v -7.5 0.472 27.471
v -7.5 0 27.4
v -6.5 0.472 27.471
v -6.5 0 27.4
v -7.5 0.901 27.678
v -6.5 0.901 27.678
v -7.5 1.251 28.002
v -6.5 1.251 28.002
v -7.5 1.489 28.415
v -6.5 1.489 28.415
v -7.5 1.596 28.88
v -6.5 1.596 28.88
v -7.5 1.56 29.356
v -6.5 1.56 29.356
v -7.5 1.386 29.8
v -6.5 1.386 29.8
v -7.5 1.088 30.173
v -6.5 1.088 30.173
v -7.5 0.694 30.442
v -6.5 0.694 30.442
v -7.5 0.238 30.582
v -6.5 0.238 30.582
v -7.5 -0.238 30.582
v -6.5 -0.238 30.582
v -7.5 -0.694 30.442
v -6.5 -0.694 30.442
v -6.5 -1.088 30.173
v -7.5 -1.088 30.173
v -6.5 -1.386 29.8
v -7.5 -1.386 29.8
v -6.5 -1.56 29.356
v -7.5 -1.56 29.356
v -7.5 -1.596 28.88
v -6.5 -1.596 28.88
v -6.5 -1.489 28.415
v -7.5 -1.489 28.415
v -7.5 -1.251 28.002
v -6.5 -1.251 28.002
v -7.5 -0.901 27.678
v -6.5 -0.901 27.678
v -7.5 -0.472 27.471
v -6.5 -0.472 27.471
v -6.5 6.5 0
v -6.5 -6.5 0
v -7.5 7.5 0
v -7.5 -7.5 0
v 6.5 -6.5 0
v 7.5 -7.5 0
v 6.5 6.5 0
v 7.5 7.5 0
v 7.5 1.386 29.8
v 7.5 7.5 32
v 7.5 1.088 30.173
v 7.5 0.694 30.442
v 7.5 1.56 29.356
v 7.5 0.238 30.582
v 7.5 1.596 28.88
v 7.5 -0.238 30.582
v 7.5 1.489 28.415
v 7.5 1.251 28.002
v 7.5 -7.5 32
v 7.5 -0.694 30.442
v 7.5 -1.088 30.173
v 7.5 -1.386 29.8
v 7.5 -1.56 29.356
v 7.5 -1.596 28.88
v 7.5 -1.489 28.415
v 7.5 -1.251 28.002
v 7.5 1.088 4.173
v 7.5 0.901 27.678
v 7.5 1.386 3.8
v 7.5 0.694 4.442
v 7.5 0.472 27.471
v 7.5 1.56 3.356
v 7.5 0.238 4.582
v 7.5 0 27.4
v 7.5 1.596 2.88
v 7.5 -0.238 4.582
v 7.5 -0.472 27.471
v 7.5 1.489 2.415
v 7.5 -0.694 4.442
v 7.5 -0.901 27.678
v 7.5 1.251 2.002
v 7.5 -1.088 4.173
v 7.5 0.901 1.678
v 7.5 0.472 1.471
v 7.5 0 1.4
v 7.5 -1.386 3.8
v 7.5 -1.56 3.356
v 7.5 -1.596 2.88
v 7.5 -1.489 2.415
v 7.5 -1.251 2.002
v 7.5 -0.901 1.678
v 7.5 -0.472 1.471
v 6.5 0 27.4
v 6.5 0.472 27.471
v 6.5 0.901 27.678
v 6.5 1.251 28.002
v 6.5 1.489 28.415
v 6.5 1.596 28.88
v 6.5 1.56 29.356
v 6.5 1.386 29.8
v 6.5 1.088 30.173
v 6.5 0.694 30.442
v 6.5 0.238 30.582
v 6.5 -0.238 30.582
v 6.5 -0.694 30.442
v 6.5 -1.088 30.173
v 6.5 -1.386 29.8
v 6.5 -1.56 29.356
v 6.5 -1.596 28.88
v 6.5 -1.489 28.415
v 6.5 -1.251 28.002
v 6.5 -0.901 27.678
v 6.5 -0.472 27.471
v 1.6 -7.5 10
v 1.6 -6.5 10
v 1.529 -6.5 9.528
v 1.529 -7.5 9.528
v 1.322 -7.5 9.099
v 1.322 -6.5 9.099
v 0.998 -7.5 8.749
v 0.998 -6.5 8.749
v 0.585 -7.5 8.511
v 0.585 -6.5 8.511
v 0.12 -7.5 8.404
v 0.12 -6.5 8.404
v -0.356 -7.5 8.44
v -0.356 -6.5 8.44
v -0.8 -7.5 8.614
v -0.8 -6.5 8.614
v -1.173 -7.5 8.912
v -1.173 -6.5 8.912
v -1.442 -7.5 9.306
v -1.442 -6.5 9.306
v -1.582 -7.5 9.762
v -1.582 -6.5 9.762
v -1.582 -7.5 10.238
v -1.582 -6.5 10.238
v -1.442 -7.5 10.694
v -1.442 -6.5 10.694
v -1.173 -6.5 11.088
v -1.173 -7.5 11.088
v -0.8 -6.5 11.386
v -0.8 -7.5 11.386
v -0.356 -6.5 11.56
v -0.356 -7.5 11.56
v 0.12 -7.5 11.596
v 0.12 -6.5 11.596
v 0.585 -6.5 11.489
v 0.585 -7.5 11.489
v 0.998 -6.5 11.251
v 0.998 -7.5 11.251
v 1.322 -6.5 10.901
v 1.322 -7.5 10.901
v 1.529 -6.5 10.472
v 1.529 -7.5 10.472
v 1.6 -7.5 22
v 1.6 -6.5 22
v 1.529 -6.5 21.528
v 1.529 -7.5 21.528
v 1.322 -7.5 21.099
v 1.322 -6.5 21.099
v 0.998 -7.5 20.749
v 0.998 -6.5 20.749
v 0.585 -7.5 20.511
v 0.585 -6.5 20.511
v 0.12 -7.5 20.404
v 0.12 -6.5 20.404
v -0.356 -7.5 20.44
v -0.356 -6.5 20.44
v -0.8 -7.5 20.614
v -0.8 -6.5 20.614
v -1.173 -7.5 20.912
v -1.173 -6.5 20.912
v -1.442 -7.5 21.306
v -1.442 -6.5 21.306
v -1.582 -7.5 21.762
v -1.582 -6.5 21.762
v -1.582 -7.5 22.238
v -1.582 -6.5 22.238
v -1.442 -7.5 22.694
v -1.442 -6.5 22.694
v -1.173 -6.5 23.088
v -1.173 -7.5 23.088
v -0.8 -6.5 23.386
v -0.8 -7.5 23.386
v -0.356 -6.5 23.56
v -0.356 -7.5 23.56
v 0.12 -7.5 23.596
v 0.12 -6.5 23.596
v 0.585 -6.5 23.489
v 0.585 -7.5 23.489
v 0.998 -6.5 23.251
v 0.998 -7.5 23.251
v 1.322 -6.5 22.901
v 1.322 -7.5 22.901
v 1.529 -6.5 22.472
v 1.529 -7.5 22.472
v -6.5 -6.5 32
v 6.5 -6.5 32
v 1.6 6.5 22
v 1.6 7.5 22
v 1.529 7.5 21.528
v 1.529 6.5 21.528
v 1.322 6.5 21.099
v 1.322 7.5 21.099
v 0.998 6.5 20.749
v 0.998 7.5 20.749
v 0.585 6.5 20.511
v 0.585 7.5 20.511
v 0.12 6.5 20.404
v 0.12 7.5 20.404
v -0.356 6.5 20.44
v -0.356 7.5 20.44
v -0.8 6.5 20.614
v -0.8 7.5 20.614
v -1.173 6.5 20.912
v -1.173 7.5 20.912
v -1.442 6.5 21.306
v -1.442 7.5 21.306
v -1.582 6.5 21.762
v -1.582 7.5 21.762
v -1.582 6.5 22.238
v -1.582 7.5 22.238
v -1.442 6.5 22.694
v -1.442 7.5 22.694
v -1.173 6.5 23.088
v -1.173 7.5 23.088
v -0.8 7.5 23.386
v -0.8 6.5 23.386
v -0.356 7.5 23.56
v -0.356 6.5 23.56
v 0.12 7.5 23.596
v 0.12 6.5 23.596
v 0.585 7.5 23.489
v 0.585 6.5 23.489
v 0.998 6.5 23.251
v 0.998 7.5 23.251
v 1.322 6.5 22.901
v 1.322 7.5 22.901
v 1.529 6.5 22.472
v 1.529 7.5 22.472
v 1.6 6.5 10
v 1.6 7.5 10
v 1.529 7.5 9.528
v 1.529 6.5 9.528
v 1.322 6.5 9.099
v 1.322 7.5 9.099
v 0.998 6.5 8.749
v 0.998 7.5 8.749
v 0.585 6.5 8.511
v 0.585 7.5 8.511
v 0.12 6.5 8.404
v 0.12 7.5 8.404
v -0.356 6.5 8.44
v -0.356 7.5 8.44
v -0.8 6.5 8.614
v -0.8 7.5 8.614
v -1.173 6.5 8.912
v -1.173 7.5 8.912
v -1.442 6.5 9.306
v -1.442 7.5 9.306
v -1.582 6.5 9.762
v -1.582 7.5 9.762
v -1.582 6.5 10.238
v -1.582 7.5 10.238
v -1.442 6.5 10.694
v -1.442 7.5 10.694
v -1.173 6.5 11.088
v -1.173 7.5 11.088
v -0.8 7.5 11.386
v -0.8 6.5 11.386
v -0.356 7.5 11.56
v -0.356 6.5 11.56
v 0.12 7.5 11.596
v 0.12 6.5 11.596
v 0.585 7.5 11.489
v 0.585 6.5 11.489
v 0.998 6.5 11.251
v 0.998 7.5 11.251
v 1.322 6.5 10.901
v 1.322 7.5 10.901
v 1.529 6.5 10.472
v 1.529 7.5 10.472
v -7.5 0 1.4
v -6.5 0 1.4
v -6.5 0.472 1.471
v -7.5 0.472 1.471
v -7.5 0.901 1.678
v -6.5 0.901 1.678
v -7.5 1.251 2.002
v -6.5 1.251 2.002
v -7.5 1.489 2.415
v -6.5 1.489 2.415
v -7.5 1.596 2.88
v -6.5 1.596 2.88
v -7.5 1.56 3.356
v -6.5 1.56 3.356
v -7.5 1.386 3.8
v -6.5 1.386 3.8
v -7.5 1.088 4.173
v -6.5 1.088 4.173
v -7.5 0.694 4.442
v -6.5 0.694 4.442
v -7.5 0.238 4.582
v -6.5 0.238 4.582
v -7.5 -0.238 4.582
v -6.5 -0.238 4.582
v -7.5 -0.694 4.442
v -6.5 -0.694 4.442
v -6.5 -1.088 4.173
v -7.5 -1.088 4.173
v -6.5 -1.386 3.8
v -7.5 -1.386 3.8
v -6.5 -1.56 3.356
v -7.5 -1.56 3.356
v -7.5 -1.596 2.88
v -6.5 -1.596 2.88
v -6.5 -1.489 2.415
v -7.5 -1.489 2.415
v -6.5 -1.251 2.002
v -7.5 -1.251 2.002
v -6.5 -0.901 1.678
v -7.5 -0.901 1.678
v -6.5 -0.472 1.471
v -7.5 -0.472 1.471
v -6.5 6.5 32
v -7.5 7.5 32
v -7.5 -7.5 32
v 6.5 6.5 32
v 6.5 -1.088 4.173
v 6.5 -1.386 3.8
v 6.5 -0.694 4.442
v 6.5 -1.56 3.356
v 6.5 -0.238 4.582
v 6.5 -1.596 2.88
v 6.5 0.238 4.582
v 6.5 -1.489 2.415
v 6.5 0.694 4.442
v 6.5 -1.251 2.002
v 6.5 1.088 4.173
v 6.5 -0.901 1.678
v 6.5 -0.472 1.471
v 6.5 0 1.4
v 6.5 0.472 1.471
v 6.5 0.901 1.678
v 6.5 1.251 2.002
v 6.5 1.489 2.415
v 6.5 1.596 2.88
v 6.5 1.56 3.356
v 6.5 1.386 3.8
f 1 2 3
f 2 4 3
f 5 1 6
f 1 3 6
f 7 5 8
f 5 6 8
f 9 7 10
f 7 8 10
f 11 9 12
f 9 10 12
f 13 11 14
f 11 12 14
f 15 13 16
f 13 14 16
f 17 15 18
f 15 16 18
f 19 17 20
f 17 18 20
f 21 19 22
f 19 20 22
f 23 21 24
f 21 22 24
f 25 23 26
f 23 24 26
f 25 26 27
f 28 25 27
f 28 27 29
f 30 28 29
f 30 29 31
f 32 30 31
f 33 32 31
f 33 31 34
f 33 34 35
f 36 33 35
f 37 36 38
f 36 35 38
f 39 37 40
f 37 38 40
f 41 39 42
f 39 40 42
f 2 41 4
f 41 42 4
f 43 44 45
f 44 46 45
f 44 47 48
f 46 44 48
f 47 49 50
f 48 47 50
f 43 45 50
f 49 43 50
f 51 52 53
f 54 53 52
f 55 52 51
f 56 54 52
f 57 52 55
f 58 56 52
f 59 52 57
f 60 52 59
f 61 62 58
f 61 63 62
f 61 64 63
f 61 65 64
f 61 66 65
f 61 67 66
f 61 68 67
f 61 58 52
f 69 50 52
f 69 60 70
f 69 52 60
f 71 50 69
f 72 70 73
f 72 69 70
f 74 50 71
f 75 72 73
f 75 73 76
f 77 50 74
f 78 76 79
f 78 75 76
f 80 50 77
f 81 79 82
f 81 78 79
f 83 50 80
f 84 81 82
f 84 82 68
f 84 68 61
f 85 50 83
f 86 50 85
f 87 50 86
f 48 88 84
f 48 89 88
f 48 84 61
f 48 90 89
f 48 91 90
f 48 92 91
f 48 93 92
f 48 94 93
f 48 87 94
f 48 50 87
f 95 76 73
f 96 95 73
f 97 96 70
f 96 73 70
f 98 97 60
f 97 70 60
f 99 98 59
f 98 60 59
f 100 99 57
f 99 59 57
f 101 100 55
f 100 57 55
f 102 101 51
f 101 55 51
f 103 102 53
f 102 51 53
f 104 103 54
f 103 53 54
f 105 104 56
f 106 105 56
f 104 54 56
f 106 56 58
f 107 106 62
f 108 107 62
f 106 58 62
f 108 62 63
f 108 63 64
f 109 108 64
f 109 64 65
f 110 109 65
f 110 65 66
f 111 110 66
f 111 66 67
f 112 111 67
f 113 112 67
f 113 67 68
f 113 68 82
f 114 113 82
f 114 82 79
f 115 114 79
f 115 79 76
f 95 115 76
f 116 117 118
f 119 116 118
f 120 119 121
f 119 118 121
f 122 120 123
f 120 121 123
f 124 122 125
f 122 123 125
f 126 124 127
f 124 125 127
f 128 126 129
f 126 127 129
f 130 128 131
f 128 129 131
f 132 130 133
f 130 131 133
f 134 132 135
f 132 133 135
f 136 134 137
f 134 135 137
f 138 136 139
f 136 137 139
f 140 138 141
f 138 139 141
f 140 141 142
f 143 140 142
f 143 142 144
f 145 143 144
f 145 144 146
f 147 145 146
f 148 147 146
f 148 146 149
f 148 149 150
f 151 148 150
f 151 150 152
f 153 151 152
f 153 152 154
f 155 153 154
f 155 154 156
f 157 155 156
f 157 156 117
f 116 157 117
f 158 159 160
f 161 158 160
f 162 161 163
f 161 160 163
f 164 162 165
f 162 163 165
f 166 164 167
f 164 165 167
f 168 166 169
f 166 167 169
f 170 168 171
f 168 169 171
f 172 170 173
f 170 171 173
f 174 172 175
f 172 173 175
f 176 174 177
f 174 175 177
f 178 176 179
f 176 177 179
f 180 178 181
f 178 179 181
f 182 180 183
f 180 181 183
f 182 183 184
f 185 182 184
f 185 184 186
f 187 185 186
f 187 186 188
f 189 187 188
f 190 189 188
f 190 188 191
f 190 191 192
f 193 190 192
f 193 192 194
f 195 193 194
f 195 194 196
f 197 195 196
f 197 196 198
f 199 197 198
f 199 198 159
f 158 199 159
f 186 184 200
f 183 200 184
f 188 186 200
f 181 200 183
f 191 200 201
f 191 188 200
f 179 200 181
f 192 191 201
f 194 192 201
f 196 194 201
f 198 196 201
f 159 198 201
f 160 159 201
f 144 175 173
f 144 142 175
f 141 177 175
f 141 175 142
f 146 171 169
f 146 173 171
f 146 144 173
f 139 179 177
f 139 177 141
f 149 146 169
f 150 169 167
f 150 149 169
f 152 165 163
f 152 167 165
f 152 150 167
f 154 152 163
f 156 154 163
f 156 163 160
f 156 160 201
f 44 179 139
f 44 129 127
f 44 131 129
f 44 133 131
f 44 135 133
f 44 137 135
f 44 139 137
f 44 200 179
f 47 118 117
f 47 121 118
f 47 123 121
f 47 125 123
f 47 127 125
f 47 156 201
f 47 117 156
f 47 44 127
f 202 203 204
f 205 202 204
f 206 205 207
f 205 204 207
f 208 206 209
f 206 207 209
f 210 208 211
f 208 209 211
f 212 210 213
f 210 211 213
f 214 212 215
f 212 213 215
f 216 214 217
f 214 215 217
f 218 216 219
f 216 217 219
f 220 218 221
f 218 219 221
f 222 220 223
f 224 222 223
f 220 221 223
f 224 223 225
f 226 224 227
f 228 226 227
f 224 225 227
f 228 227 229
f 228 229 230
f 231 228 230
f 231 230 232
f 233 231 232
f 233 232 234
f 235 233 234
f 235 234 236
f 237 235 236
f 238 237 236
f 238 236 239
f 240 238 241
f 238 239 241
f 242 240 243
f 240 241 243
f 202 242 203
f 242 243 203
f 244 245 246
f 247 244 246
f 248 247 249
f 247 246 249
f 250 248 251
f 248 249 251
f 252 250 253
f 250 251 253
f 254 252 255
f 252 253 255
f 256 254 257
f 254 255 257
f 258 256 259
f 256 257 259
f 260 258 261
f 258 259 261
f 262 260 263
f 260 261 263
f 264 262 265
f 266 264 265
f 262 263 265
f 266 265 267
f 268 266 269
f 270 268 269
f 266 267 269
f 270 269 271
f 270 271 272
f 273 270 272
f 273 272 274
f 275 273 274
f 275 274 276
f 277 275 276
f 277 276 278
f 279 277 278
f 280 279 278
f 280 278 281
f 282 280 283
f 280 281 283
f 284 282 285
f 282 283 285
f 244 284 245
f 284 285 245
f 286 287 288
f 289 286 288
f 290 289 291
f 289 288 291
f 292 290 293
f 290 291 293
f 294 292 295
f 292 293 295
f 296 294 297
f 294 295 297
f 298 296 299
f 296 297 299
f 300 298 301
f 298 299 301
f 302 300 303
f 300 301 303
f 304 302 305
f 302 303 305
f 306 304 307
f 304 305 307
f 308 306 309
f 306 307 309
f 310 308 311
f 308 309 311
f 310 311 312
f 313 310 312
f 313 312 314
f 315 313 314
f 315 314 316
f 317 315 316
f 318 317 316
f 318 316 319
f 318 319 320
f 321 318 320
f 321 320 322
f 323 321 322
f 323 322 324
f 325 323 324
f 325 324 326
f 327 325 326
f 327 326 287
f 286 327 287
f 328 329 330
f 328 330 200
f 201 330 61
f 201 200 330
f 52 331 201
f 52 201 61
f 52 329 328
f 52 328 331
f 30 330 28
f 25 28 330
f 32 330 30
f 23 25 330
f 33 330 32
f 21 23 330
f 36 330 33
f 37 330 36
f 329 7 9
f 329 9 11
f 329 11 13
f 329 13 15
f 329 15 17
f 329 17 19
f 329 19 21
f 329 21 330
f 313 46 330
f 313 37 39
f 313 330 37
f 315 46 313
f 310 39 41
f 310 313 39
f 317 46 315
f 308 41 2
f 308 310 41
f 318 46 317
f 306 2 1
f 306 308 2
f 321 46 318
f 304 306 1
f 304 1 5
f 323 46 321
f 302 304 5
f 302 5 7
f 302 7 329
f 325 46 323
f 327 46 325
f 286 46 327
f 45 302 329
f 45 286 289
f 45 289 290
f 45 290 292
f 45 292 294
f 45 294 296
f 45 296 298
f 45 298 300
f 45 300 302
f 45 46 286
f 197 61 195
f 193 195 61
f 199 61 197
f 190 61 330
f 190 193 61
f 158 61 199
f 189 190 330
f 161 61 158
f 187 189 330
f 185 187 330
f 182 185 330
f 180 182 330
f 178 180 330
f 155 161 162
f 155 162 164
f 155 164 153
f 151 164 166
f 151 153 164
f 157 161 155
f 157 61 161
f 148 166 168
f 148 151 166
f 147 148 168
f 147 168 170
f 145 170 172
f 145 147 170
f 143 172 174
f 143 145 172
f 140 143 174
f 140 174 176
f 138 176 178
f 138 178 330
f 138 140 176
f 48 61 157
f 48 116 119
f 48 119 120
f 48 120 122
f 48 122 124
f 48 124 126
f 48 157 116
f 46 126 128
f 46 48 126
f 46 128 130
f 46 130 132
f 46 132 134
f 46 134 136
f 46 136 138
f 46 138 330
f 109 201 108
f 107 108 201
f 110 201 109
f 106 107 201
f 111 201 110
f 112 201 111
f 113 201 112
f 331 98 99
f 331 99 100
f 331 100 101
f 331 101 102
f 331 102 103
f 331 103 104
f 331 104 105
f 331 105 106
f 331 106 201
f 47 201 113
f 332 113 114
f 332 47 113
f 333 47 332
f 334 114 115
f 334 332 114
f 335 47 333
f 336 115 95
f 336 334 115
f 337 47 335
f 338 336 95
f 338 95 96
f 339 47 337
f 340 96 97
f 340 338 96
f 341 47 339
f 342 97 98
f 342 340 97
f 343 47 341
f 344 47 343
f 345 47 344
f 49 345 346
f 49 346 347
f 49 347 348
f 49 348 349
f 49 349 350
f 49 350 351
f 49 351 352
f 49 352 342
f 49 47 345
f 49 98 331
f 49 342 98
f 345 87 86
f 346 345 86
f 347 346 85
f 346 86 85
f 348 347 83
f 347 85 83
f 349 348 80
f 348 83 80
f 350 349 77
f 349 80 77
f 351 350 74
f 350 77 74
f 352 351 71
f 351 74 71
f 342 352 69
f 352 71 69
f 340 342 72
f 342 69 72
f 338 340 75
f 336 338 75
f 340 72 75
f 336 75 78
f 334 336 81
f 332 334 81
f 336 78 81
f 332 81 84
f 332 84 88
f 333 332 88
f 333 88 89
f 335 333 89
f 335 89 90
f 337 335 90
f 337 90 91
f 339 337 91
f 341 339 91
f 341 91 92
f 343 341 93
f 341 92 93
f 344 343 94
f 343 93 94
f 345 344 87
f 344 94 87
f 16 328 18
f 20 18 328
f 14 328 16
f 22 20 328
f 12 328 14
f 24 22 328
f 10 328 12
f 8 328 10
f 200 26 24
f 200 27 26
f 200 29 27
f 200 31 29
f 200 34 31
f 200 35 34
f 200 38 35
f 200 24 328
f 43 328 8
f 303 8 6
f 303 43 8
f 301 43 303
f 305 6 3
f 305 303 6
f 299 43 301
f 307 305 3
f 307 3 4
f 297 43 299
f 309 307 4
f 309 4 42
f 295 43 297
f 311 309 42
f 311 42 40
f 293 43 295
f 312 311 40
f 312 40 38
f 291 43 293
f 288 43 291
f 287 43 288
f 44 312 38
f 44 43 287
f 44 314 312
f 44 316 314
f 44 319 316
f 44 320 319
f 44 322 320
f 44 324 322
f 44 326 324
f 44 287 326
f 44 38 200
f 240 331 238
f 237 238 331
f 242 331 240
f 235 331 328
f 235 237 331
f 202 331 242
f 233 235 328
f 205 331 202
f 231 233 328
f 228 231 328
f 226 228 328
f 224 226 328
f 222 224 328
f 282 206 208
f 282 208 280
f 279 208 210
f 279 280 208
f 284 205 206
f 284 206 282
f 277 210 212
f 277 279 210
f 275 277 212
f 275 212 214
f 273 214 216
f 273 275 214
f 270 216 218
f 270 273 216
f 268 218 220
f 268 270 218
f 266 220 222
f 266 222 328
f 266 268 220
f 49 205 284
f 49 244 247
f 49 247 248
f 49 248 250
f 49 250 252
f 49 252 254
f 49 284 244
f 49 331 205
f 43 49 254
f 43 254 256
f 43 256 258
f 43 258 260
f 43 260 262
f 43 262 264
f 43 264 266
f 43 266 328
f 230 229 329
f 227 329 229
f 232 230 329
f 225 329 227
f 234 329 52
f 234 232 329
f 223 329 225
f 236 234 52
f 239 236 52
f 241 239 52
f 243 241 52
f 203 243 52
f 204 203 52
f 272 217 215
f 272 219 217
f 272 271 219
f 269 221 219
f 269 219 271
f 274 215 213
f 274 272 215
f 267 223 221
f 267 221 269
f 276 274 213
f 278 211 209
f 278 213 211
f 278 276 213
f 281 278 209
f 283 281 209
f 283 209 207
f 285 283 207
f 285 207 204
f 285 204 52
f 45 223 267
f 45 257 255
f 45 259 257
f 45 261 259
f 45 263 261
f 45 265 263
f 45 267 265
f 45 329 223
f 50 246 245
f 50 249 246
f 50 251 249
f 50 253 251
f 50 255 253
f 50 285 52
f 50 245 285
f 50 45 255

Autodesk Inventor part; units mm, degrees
ref_plane "YZ Plane" through (0, 0, 0) normal (1, 0, 0) x (0, 1, 0)
ref_plane "XZ Plane" through (0, 0, 0) normal (0, 1, 0) x (-1, 0, 0)
ref_plane "XY Plane" through (0, 0, 0) normal (0, 0, 1) x (1, 0, 0)
sketch "スケッチ1" plane through (0, 0, 0) normal (0, 0, 1) x (1, 0, 0)
  line L0 (7.5, -7.5) -> (-7.5, -7.5)
  line L1 (-7.5, -7.5) -> (-7.5, 7.5)
  line L2 (-7.5, 7.5) -> (7.5, 7.5)
  line L3 (7.5, 7.5) -> (7.5, -7.5)
  line L4 (7.5, -7.5) -> (-7.5, 7.5) construction
  line L5 (-7.5, -7.5) -> (7.5, 7.5) construction
  line L6 (-7.5, 0) -> (7.5, 0) construction
  line L7 (6.5, 6.5) -> (-6.5, 6.5)
  line L8 (-6.5, 6.5) -> (-6.5, -6.5)
  line L9 (-6.5, -6.5) -> (6.5, -6.5)
  line L10 (6.5, -6.5) -> (6.5, 6.5)
  point P0 (0, 0)
  dimension "d0" = 15
  dimension "d1" = 15
  dimension "d2" = 1
extrude "押し出し1" add sketch "スケッチ1" along normal blind 32
sketch "スケッチ2" plane through (7.5, -7.5, 0) normal (1, 0, 0) x (0, 0, -1)
  line L0 (0, 15) -> (0, 0) projected
  line L1 (0, 15) -> (-32, 15) projected
  line L2 (-32, 0) -> (-32, 15) projected
  line L3 (0, 0) -> (-32, 0) projected
  line L4 (-32, 7.5) -> (0, 7.5) construction
  line L5 (-16, 7.5) -> (-16, 15) construction
  circle A0 centre (-29, 7.5) radius 3 construction
  circle A1 centre (-29, 7.5) radius 1.6
  circle A2 centre (-3, 7.5) radius 3 construction
  circle A3 centre (-3, 7.5) radius 1.6
  dimension "d5" = 6
  dimension "d6" = 3.2
extrude "押し出し2" cut sketch "スケッチ2" against normal through all contours A1 | A3
sketch "スケッチ3" plane through (-7.5, 7.5, 0) normal (0, 1, 0) x (1, 0, 0)
  line L0 (0, 0) -> (15, 0) projected
  line L1 (0, 0) -> (0, -32) projected
  line L2 (15, -32) -> (0, -32) projected
  line L3 (15, 0) -> (15, -32) projected
  line L4 (7.5, 0) -> (7.5, -32) construction
  line L5 (15, -16) -> (0, -16) construction
  circle A0 centre (7.5, -10) radius 1.6
  circle A1 centre (7.5, -22) radius 1.6
  dimension "d9" = 3.2
  dimension "d10" = 6
extrude "押し出し3" cut sketch "スケッチ3" against normal through all contours A0 | A1
properties part number "支え角柱(サーボ用)" material "アルミニウム 6061"
